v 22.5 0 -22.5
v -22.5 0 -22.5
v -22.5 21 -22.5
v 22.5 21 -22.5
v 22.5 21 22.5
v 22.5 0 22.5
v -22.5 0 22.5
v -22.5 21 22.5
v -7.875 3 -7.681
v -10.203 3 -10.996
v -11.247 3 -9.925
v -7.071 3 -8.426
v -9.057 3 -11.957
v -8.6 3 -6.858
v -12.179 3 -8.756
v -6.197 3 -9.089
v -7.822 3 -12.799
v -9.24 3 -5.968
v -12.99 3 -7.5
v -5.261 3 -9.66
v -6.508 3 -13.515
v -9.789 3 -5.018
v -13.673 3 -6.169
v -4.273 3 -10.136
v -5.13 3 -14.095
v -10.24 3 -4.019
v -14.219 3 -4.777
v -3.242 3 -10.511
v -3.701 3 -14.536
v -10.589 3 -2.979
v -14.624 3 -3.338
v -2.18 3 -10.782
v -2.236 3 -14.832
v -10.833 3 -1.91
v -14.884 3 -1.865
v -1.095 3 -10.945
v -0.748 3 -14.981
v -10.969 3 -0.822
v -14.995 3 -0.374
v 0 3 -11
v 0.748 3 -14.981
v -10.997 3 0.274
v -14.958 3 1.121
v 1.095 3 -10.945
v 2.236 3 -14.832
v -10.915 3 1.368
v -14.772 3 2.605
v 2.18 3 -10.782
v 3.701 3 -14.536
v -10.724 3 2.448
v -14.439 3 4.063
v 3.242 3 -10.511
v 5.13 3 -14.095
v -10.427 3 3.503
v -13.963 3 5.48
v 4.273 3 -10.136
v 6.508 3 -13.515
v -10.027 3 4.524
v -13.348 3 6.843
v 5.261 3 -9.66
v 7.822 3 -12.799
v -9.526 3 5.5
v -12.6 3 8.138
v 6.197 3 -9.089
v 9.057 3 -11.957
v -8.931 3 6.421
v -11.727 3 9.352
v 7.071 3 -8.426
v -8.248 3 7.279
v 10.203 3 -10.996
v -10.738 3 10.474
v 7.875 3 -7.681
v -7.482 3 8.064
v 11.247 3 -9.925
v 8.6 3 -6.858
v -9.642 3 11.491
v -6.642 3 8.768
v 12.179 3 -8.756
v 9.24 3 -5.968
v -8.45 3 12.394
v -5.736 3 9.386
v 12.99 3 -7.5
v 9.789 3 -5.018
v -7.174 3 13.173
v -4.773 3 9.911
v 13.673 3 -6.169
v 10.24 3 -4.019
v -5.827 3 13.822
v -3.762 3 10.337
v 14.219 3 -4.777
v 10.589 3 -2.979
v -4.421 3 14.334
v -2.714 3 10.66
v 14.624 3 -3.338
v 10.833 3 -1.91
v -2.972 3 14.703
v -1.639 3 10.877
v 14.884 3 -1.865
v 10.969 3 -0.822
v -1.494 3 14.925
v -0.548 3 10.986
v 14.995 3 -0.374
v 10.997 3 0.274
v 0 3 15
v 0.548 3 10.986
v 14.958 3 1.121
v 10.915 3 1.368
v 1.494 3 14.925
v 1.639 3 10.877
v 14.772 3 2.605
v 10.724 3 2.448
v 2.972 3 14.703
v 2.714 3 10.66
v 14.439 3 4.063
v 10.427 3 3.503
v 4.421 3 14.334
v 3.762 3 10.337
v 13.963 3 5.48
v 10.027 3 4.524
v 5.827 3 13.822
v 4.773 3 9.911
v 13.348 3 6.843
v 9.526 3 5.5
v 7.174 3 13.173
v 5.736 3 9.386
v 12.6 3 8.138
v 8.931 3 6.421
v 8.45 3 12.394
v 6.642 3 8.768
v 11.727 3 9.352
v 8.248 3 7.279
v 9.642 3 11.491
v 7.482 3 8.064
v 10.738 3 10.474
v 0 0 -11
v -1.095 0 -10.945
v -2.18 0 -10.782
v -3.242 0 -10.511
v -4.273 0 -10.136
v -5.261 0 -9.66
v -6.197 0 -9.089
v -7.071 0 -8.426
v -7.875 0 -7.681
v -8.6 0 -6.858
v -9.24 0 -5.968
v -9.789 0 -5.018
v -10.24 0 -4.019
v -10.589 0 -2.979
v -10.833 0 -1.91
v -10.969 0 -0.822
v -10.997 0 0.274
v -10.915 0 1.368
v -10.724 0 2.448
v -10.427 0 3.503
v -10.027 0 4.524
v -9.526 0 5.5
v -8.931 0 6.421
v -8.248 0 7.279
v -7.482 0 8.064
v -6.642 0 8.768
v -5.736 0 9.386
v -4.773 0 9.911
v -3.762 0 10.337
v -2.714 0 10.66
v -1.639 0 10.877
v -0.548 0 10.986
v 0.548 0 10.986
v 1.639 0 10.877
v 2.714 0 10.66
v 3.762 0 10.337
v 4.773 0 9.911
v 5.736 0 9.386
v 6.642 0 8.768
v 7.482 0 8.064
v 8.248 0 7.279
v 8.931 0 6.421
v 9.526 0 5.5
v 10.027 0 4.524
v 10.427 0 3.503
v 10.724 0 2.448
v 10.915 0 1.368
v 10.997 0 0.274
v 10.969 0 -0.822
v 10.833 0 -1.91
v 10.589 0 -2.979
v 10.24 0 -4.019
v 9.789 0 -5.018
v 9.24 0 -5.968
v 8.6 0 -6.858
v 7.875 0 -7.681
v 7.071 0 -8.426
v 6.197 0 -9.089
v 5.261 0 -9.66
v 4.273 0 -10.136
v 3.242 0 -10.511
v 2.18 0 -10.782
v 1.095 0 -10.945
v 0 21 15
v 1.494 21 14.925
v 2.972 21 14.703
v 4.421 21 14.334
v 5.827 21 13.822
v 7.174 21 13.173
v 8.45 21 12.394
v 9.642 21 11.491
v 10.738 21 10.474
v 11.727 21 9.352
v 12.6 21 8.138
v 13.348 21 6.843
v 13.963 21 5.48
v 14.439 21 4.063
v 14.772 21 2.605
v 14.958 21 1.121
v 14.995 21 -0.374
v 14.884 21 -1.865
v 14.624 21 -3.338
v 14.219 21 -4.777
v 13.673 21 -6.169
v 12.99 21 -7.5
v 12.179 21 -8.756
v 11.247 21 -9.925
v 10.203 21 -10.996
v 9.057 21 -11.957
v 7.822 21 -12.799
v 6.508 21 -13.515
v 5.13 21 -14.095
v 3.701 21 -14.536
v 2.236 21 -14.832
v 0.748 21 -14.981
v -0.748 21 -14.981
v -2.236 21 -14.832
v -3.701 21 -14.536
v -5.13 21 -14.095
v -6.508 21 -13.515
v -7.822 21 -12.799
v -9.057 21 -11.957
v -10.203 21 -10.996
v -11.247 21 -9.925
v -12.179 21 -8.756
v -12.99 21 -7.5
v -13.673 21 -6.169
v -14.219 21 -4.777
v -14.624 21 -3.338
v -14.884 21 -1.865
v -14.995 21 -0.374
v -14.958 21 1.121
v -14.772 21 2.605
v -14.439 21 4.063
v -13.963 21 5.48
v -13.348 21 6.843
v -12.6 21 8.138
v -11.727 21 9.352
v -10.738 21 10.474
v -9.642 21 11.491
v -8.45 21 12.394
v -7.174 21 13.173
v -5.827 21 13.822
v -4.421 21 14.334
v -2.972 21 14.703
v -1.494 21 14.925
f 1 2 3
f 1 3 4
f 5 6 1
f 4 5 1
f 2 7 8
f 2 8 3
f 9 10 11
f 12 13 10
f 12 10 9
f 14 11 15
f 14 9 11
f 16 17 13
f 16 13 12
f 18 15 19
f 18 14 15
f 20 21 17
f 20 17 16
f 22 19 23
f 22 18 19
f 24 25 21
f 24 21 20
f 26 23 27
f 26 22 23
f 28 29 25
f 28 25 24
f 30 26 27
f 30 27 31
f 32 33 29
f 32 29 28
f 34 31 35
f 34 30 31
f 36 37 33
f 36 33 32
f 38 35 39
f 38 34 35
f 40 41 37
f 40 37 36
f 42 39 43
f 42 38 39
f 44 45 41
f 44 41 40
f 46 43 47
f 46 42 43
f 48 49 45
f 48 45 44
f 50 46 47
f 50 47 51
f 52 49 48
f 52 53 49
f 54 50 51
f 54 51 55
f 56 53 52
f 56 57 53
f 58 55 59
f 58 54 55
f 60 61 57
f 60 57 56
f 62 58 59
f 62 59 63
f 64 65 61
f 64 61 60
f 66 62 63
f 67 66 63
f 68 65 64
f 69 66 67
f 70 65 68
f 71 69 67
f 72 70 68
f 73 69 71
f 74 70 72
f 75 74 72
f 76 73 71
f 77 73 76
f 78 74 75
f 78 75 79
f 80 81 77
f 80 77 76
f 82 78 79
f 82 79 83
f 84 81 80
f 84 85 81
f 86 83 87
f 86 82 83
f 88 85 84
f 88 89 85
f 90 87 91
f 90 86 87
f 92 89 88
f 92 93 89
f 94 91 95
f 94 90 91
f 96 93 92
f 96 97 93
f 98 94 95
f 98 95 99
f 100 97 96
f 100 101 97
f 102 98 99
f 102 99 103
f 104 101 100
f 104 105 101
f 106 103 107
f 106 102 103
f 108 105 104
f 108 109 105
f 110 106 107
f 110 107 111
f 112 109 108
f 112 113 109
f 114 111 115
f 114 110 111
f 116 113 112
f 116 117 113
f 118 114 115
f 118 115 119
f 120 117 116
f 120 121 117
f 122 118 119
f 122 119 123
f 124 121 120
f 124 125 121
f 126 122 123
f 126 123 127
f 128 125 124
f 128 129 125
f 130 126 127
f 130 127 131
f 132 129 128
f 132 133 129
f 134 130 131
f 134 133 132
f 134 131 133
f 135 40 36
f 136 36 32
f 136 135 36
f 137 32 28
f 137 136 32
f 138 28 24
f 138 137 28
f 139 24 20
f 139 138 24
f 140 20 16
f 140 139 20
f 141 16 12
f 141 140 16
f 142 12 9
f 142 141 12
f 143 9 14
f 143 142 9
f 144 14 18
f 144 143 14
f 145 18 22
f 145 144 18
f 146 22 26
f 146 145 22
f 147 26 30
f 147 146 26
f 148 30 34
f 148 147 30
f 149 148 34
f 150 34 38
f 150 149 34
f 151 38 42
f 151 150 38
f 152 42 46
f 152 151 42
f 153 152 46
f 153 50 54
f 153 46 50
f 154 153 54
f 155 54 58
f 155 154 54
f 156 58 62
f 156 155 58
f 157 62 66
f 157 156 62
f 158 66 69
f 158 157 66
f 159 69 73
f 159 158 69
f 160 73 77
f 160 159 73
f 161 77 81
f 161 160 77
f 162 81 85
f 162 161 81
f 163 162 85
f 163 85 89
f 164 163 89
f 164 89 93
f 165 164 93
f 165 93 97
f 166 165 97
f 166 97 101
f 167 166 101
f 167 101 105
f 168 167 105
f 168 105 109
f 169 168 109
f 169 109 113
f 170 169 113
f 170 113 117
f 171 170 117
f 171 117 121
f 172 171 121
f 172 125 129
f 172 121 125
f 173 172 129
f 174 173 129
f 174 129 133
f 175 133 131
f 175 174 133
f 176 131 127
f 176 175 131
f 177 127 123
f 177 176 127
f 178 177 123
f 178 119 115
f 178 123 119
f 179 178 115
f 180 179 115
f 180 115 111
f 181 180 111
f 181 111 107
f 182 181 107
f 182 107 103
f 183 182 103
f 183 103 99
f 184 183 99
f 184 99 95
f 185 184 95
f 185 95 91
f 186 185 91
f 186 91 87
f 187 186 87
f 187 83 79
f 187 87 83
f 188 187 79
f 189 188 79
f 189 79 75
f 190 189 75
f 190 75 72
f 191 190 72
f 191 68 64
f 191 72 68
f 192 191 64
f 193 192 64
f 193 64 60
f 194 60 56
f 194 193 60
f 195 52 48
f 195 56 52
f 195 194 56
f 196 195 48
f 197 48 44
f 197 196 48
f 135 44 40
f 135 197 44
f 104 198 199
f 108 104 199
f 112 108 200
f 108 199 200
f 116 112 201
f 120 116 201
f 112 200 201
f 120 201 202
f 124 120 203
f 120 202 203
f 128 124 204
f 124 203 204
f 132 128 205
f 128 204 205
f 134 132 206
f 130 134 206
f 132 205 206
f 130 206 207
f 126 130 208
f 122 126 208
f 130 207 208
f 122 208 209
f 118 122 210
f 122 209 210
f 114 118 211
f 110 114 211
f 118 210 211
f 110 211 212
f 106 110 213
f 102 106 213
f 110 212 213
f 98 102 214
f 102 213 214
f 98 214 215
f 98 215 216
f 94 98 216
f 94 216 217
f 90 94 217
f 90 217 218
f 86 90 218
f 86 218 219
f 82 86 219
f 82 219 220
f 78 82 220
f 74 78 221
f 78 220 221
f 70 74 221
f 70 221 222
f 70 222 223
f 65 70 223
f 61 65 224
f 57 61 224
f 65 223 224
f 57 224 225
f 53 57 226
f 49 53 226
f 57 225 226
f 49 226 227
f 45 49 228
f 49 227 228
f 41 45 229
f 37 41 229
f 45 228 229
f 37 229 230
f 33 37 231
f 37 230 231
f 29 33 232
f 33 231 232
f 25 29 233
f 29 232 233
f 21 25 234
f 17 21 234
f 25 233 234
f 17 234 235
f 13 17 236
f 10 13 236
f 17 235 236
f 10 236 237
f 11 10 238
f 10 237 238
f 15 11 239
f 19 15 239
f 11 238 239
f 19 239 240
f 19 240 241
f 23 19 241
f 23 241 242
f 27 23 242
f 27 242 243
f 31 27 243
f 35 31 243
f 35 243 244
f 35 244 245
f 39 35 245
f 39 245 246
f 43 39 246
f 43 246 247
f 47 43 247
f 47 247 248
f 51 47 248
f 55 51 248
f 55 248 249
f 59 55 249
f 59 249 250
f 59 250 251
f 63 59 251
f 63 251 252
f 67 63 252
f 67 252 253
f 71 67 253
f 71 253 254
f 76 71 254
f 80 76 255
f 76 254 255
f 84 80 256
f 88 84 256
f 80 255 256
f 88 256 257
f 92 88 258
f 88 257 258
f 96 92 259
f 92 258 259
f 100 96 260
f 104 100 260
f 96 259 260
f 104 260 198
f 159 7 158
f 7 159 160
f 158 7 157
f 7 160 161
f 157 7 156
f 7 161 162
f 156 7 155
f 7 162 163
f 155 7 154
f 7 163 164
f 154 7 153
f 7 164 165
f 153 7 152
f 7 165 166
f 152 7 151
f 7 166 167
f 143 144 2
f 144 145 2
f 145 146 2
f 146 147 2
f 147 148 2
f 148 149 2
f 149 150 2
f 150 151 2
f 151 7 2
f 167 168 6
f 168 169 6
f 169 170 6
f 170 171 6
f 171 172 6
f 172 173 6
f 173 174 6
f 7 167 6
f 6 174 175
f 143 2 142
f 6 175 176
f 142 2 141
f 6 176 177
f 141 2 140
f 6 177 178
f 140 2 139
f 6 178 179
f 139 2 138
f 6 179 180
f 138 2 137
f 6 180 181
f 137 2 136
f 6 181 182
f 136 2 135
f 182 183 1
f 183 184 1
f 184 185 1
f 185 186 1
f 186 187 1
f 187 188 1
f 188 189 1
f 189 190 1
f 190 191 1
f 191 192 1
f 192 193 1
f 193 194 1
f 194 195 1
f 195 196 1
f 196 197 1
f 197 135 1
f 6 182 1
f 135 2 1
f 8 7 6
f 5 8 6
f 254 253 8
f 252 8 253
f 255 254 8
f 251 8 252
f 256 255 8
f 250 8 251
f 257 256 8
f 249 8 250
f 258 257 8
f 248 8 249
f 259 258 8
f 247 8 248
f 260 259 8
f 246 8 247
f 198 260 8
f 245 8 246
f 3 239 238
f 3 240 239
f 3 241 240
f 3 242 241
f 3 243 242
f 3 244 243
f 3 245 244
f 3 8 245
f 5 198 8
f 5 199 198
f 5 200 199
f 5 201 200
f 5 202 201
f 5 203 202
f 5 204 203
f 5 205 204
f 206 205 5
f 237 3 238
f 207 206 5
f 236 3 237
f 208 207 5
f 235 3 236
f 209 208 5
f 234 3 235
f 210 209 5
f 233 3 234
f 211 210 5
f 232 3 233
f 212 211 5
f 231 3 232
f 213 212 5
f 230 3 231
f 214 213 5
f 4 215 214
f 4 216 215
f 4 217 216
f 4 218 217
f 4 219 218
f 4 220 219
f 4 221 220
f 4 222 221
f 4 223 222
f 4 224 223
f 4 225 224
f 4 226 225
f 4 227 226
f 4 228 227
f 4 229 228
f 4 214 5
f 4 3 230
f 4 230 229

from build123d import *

# Parameters (mm, degrees)
SKETCH2_W           = 45
SKETCH2_H           = 45
SKETCH2_R           = 11
BOSS_EXTRUDE1_DEPTH = 21
SKETCH3_R           = 15
CUT_EXTRUDE1_DEPTH  = 18


with BuildPart() as part:
    # Sketch2 → Boss-Extrude1 (new body)
    with BuildSketch(Plane(origin=(0, 0, 0), x_dir=(1, 0, 0), z_dir=(0, 1, 0))):
        Rectangle(SKETCH2_W, SKETCH2_H)
        with Locations(Location((0, 0, 0), (0, 0, 90))):
            Circle(SKETCH2_R, mode=Mode.SUBTRACT)
    extrude(amount=BOSS_EXTRUDE1_DEPTH)

    # Sketch3 → Cut-Extrude1 (cut)
    with BuildSketch(Plane(origin=(0, 21, 0), x_dir=(1, 0, 0), z_dir=(0, 1, 0))):
        with Locations(Location((0, 0, 0), (0, 0, 270))):
            Circle(SKETCH3_R)
    extrude(amount=-CUT_EXTRUDE1_DEPTH, mode=Mode.SUBTRACT)


solid = part.part
